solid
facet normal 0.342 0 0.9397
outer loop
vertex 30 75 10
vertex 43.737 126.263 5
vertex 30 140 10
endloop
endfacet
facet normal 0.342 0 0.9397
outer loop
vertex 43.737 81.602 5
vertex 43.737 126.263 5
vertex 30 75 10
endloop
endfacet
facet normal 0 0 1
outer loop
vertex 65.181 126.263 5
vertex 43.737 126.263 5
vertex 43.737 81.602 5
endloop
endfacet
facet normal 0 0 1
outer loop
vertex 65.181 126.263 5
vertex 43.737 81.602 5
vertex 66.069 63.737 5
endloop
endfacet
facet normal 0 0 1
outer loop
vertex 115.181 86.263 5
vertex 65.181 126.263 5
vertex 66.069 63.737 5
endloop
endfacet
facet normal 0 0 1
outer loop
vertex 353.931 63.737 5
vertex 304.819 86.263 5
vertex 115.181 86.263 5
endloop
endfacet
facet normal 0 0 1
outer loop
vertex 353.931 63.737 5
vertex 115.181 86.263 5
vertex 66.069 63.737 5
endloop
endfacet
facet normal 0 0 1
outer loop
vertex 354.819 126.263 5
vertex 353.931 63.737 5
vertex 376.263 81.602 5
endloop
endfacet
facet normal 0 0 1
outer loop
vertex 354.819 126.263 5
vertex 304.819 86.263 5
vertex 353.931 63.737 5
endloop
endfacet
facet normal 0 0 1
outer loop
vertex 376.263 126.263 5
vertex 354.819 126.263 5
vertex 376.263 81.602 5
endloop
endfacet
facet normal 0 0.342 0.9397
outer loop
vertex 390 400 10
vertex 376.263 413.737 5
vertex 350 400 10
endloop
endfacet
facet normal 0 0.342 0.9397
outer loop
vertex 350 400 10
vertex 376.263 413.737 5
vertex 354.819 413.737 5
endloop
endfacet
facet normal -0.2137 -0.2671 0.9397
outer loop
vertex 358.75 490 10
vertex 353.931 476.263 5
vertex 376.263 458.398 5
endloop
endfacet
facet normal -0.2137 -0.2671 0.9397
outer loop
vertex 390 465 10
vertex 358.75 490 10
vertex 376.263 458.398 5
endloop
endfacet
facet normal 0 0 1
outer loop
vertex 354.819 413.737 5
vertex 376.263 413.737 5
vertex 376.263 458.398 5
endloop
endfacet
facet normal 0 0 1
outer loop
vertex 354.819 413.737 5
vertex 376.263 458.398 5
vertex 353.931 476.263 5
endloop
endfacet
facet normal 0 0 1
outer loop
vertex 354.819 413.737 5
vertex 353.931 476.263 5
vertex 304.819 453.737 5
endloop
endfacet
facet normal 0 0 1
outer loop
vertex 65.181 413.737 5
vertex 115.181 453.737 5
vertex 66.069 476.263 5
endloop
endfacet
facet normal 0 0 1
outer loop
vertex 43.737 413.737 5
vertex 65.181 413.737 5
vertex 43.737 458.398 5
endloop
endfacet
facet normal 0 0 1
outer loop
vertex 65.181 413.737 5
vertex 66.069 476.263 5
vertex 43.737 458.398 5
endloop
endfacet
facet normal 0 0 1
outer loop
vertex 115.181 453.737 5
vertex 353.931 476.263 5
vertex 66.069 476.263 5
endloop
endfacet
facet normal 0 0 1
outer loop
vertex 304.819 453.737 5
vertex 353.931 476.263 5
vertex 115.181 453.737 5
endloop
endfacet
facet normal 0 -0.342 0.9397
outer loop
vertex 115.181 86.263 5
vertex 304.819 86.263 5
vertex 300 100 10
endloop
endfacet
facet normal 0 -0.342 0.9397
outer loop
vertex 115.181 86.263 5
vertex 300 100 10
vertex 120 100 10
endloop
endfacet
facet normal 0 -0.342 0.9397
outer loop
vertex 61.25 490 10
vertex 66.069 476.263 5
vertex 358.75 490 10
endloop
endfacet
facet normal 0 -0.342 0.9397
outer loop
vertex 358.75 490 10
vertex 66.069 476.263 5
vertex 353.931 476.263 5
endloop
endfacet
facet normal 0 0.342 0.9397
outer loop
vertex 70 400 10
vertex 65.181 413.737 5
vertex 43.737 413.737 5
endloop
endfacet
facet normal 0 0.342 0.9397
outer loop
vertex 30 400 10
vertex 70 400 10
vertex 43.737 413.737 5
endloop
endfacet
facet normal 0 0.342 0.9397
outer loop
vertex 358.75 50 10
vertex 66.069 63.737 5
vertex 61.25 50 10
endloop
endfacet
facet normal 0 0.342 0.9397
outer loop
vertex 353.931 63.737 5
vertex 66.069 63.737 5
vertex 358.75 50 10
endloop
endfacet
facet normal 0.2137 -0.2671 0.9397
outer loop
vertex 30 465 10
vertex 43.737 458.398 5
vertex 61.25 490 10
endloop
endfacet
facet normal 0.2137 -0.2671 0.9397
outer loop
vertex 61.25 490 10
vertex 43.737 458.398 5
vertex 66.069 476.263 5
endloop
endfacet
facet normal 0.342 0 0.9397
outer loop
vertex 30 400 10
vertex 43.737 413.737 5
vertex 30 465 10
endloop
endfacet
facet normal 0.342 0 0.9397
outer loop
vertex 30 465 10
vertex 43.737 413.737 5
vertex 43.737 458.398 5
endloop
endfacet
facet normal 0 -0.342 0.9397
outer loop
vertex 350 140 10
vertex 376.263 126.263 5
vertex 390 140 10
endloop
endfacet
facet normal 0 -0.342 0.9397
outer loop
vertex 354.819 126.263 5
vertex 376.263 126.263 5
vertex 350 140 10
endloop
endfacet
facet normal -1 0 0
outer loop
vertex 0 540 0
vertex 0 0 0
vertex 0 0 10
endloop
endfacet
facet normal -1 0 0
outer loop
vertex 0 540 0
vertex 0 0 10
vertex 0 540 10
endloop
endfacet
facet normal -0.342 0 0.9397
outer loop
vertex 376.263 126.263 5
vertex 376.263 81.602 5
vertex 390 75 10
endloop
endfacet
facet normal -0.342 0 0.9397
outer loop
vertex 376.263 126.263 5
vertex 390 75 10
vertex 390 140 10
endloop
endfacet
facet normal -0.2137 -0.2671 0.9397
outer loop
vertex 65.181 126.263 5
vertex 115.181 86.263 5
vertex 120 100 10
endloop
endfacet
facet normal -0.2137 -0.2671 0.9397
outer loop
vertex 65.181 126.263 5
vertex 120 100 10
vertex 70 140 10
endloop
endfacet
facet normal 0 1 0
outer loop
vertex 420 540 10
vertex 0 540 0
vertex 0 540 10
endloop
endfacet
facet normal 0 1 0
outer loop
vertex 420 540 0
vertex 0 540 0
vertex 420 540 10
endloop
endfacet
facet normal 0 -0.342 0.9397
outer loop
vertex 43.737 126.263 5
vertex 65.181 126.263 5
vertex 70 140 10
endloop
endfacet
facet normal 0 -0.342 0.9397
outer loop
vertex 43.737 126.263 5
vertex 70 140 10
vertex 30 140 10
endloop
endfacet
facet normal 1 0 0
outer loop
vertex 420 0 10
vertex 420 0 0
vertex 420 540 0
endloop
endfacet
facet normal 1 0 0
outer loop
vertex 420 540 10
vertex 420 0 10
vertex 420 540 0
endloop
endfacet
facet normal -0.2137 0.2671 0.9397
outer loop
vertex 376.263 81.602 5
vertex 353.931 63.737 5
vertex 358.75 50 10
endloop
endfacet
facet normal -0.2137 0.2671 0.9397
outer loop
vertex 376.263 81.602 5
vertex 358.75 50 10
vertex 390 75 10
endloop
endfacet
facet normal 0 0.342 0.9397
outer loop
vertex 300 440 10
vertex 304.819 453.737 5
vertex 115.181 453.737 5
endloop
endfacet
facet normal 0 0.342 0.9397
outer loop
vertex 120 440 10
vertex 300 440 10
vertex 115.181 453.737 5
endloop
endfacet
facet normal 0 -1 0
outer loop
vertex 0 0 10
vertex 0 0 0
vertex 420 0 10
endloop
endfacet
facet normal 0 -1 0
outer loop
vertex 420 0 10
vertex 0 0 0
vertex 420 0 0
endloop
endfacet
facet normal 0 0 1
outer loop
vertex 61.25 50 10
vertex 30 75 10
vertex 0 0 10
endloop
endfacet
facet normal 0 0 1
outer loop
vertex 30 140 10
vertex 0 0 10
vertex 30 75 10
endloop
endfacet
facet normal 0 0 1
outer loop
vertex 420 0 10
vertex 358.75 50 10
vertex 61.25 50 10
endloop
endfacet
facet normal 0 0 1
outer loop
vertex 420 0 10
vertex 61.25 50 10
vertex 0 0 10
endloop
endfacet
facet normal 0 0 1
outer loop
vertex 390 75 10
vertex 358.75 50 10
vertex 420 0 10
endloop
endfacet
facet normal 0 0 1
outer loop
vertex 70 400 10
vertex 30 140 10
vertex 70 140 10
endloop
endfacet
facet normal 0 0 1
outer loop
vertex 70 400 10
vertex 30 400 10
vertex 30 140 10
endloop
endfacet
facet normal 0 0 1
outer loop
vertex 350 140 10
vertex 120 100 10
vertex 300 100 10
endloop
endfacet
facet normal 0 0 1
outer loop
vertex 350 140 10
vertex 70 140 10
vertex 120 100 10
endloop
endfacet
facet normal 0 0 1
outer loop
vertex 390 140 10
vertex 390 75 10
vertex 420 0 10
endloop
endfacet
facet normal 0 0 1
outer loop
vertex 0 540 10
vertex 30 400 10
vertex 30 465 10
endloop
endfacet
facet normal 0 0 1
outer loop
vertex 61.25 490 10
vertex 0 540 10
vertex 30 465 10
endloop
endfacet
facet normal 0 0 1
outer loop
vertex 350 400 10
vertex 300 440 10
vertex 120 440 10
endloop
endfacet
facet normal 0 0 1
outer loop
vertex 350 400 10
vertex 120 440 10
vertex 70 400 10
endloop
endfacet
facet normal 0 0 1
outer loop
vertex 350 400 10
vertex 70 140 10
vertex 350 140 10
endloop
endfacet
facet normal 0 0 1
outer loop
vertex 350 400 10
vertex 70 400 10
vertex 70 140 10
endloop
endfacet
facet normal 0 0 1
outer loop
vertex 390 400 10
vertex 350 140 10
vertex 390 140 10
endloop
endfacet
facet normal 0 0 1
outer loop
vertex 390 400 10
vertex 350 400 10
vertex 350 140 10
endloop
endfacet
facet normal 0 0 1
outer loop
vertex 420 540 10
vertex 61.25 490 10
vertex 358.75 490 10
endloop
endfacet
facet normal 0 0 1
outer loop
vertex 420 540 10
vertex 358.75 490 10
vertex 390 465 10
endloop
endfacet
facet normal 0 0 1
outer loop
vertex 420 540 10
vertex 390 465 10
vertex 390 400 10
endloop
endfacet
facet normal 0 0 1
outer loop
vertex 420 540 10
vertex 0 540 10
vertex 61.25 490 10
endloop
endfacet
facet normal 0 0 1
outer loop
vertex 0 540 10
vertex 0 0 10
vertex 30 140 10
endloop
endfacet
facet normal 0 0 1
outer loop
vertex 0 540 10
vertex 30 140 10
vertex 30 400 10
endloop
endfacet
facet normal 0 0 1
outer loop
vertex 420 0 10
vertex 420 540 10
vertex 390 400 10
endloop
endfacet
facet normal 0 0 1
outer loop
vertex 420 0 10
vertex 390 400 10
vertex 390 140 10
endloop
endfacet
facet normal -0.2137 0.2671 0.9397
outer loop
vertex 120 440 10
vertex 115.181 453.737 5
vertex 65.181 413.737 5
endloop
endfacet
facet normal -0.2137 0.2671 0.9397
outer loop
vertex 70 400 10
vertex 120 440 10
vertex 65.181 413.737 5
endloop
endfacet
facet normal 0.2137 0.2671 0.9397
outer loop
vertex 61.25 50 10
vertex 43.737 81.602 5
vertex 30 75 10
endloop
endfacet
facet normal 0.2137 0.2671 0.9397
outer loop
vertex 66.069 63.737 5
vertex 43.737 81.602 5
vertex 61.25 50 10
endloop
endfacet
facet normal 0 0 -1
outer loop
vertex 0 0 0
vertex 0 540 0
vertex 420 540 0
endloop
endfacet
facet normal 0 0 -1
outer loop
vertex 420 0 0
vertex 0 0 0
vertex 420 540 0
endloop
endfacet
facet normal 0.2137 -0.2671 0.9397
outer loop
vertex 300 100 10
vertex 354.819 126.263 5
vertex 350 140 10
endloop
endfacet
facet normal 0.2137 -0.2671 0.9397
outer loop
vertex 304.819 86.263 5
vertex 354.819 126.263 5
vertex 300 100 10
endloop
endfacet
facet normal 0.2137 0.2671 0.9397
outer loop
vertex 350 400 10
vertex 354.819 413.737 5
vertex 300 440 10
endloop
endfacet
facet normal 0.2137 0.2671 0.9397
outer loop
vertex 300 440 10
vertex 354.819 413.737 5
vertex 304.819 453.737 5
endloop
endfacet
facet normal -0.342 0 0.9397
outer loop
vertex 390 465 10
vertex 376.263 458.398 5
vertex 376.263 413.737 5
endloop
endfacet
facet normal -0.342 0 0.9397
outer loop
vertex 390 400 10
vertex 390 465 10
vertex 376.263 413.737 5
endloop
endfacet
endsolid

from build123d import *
from OCP.BRepFilletAPI import BRepFilletAPI_MakeChamfer

# Parameters (mm, degrees)
ESQUISSE1_W             = 420
ESQUISSE1_H             = 540
BOSS_EXTRU_1_DEPTH      = 10
ENL_V_MAT_EXTRU_1_DEPTH = 5
CHANFREIN1_SIZE         = 5
CHANFREIN1_SIZE_2       = 13.737387097


with BuildPart() as part:
    # Esquisse1 → Boss.-Extru.1 (new body)
    with BuildSketch(Plane.XY):
        with Locations((210, 270)):
            Rectangle(ESQUISSE1_W, ESQUISSE1_H)
    extrude(amount=BOSS_EXTRU_1_DEPTH)

    # Esquisse2 → Enlèv. mat.-Extru.1 (cut)
    with BuildSketch(Plane.XY.offset(10)):
        Polygon((300, 100), (120, 100), (70, 140), (30, 140), (30, 75), (61.25, 50), (358.75, 50), (390, 75), (390, 140), (350, 140), align=None)
        Polygon((30, 465), (61.25, 490), (358.75, 490), (390, 465), (390, 400), (350, 400), (300, 440), (120, 440), (70, 400), (30, 400), align=None)
    extrude(amount=-ENL_V_MAT_EXTRU_1_DEPTH, mode=Mode.SUBTRACT)

    # Chanfrein1
    chanfrein1_edges_1 = [part.edges().sort_by_distance(p)[0] for p in [
        (390, 107.5, 5),
    ]]
    chanfrein1_side_1 = [part.faces().sort_by_distance(p)[0] for p in [
        (390, 107.5, 5.1),
    ]]
    chanfrein1_edges_2 = [part.edges().sort_by_distance(p)[0] for p in [
        (374.375, 62.5, 5),
    ]]
    chanfrein1_side_2 = [part.faces().sort_by_distance(p)[0] for p in [
        (374.375, 62.5, 5.1),
    ]]
    chanfrein1_edges_3 = [part.edges().sort_by_distance(p)[0] for p in [
        (210, 50, 5),
    ]]
    chanfrein1_side_3 = [part.faces().sort_by_distance(p)[0] for p in [
        (210, 50, 5.1),
    ]]
    chanfrein1_edges_4 = [part.edges().sort_by_distance(p)[0] for p in [
        (45.625, 62.5, 5),
    ]]
    chanfrein1_side_4 = [part.faces().sort_by_distance(p)[0] for p in [
        (45.625, 62.5, 5.1),
    ]]
    chanfrein1_edges_5 = [part.edges().sort_by_distance(p)[0] for p in [
        (30, 107.5, 5),
    ]]
    chanfrein1_side_5 = [part.faces().sort_by_distance(p)[0] for p in [
        (30, 107.5, 5.1),
    ]]
    chanfrein1_edges_6 = [part.edges().sort_by_distance(p)[0] for p in [
        (50, 140, 5),
    ]]
    chanfrein1_side_6 = [part.faces().sort_by_distance(p)[0] for p in [
        (50, 140, 5.1),
    ]]
    chanfrein1_edges_7 = [part.edges().sort_by_distance(p)[0] for p in [
        (95, 120, 5),
    ]]
    chanfrein1_side_7 = [part.faces().sort_by_distance(p)[0] for p in [
        (95, 120, 5.1),
    ]]
    chanfrein1_edges_8 = [part.edges().sort_by_distance(p)[0] for p in [
        (210, 100, 5),
    ]]
    chanfrein1_side_8 = [part.faces().sort_by_distance(p)[0] for p in [
        (210, 100, 5.1),
    ]]
    chanfrein1_edges_9 = [part.edges().sort_by_distance(p)[0] for p in [
        (325, 120, 5),
    ]]
    chanfrein1_side_9 = [part.faces().sort_by_distance(p)[0] for p in [
        (325, 120, 5.1),
    ]]
    chanfrein1_edges_10 = [part.edges().sort_by_distance(p)[0] for p in [
        (370, 140, 5),
    ]]
    chanfrein1_side_10 = [part.faces().sort_by_distance(p)[0] for p in [
        (370, 140, 5.1),
    ]]
    chanfrein1_edges_11 = [part.edges().sort_by_distance(p)[0] for p in [
        (45.625, 477.5, 5),
    ]]
    chanfrein1_side_11 = [part.faces().sort_by_distance(p)[0] for p in [
        (45.625, 477.5, 5.1),
    ]]
    chanfrein1_edges_12 = [part.edges().sort_by_distance(p)[0] for p in [
        (210, 490, 5),
    ]]
    chanfrein1_side_12 = [part.faces().sort_by_distance(p)[0] for p in [
        (210, 490, 5.1),
    ]]
    chanfrein1_edges_13 = [part.edges().sort_by_distance(p)[0] for p in [
        (374.375, 477.5, 5),
    ]]
    chanfrein1_side_13 = [part.faces().sort_by_distance(p)[0] for p in [
        (374.375, 477.5, 5.1),
    ]]
    chanfrein1_edges_14 = [part.edges().sort_by_distance(p)[0] for p in [
        (390, 432.5, 5),
    ]]
    chanfrein1_side_14 = [part.faces().sort_by_distance(p)[0] for p in [
        (390, 432.5, 5.1),
    ]]
    chanfrein1_edges_15 = [part.edges().sort_by_distance(p)[0] for p in [
        (370, 400, 5),
    ]]
    chanfrein1_side_15 = [part.faces().sort_by_distance(p)[0] for p in [
        (370, 400, 5.1),
    ]]
    chanfrein1_edges_16 = [part.edges().sort_by_distance(p)[0] for p in [
        (325, 420, 5),
    ]]
    chanfrein1_side_16 = [part.faces().sort_by_distance(p)[0] for p in [
        (325, 420, 5.1),
    ]]
    chanfrein1_edges_17 = [part.edges().sort_by_distance(p)[0] for p in [
        (210, 440, 5),
    ]]
    chanfrein1_side_17 = [part.faces().sort_by_distance(p)[0] for p in [
        (210, 440, 5.1),
    ]]
    chanfrein1_edges_18 = [part.edges().sort_by_distance(p)[0] for p in [
        (95, 420, 5),
    ]]
    chanfrein1_side_18 = [part.faces().sort_by_distance(p)[0] for p in [
        (95, 420, 5.1),
    ]]
    chanfrein1_edges_19 = [part.edges().sort_by_distance(p)[0] for p in [
        (50, 400, 5),
    ]]
    chanfrein1_side_19 = [part.faces().sort_by_distance(p)[0] for p in [
        (50, 400, 5.1),
    ]]
    chanfrein1_edges_20 = [part.edges().sort_by_distance(p)[0] for p in [
        (30, 432.5, 5),
    ]]
    chanfrein1_side_20 = [part.faces().sort_by_distance(p)[0] for p in [
        (30, 432.5, 5.1),
    ]]
    chanfrein1 = BRepFilletAPI_MakeChamfer(part.part.solid().wrapped)
    for e in chanfrein1_edges_1:
        chanfrein1.Add(CHANFREIN1_SIZE - 0.0001, CHANFREIN1_SIZE_2 - 0.0001, e.wrapped, chanfrein1_side_1[0].wrapped)
    for e in chanfrein1_edges_2:
        chanfrein1.Add(CHANFREIN1_SIZE - 0.0001, CHANFREIN1_SIZE_2 - 0.0001, e.wrapped, chanfrein1_side_2[0].wrapped)
    for e in chanfrein1_edges_3:
        chanfrein1.Add(CHANFREIN1_SIZE - 0.0001, CHANFREIN1_SIZE_2 - 0.0001, e.wrapped, chanfrein1_side_3[0].wrapped)
    for e in chanfrein1_edges_4:
        chanfrein1.Add(CHANFREIN1_SIZE - 0.0001, CHANFREIN1_SIZE_2 - 0.0001, e.wrapped, chanfrein1_side_4[0].wrapped)
    for e in chanfrein1_edges_5:
        chanfrein1.Add(CHANFREIN1_SIZE - 0.0001, CHANFREIN1_SIZE_2 - 0.0001, e.wrapped, chanfrein1_side_5[0].wrapped)
    for e in chanfrein1_edges_6:
        chanfrein1.Add(CHANFREIN1_SIZE - 0.0001, CHANFREIN1_SIZE_2 - 0.0001, e.wrapped, chanfrein1_side_6[0].wrapped)
    for e in chanfrein1_edges_7:
        chanfrein1.Add(CHANFREIN1_SIZE - 0.0001, CHANFREIN1_SIZE_2 - 0.0001, e.wrapped, chanfrein1_side_7[0].wrapped)
    for e in chanfrein1_edges_8:
        chanfrein1.Add(CHANFREIN1_SIZE - 0.0001, CHANFREIN1_SIZE_2 - 0.0001, e.wrapped, chanfrein1_side_8[0].wrapped)
    for e in chanfrein1_edges_9:
        chanfrein1.Add(CHANFREIN1_SIZE - 0.0001, CHANFREIN1_SIZE_2 - 0.0001, e.wrapped, chanfrein1_side_9[0].wrapped)
    for e in chanfrein1_edges_10:
        chanfrein1.Add(CHANFREIN1_SIZE - 0.0001, CHANFREIN1_SIZE_2 - 0.0001, e.wrapped, chanfrein1_side_10[0].wrapped)
    for e in chanfrein1_edges_11:
        chanfrein1.Add(CHANFREIN1_SIZE - 0.0001, CHANFREIN1_SIZE_2 - 0.0001, e.wrapped, chanfrein1_side_11[0].wrapped)
    for e in chanfrein1_edges_12:
        chanfrein1.Add(CHANFREIN1_SIZE - 0.0001, CHANFREIN1_SIZE_2 - 0.0001, e.wrapped, chanfrein1_side_12[0].wrapped)
    for e in chanfrein1_edges_13:
        chanfrein1.Add(CHANFREIN1_SIZE - 0.0001, CHANFREIN1_SIZE_2 - 0.0001, e.wrapped, chanfrein1_side_13[0].wrapped)
    for e in chanfrein1_edges_14:
        chanfrein1.Add(CHANFREIN1_SIZE - 0.0001, CHANFREIN1_SIZE_2 - 0.0001, e.wrapped, chanfrein1_side_14[0].wrapped)
    for e in chanfrein1_edges_15:
        chanfrein1.Add(CHANFREIN1_SIZE - 0.0001, CHANFREIN1_SIZE_2 - 0.0001, e.wrapped, chanfrein1_side_15[0].wrapped)
    for e in chanfrein1_edges_16:
        chanfrein1.Add(CHANFREIN1_SIZE - 0.0001, CHANFREIN1_SIZE_2 - 0.0001, e.wrapped, chanfrein1_side_16[0].wrapped)
    for e in chanfrein1_edges_17:
        chanfrein1.Add(CHANFREIN1_SIZE - 0.0001, CHANFREIN1_SIZE_2 - 0.0001, e.wrapped, chanfrein1_side_17[0].wrapped)
    for e in chanfrein1_edges_18:
        chanfrein1.Add(CHANFREIN1_SIZE - 0.0001, CHANFREIN1_SIZE_2 - 0.0001, e.wrapped, chanfrein1_side_18[0].wrapped)
    for e in chanfrein1_edges_19:
        chanfrein1.Add(CHANFREIN1_SIZE - 0.0001, CHANFREIN1_SIZE_2 - 0.0001, e.wrapped, chanfrein1_side_19[0].wrapped)
    for e in chanfrein1_edges_20:
        chanfrein1.Add(CHANFREIN1_SIZE - 0.0001, CHANFREIN1_SIZE_2 - 0.0001, e.wrapped, chanfrein1_side_20[0].wrapped)
    add(Compound.cast(chanfrein1.Shape()), mode=Mode.REPLACE)  # a hair under: the kernel refuses the full size


solid = part.part
